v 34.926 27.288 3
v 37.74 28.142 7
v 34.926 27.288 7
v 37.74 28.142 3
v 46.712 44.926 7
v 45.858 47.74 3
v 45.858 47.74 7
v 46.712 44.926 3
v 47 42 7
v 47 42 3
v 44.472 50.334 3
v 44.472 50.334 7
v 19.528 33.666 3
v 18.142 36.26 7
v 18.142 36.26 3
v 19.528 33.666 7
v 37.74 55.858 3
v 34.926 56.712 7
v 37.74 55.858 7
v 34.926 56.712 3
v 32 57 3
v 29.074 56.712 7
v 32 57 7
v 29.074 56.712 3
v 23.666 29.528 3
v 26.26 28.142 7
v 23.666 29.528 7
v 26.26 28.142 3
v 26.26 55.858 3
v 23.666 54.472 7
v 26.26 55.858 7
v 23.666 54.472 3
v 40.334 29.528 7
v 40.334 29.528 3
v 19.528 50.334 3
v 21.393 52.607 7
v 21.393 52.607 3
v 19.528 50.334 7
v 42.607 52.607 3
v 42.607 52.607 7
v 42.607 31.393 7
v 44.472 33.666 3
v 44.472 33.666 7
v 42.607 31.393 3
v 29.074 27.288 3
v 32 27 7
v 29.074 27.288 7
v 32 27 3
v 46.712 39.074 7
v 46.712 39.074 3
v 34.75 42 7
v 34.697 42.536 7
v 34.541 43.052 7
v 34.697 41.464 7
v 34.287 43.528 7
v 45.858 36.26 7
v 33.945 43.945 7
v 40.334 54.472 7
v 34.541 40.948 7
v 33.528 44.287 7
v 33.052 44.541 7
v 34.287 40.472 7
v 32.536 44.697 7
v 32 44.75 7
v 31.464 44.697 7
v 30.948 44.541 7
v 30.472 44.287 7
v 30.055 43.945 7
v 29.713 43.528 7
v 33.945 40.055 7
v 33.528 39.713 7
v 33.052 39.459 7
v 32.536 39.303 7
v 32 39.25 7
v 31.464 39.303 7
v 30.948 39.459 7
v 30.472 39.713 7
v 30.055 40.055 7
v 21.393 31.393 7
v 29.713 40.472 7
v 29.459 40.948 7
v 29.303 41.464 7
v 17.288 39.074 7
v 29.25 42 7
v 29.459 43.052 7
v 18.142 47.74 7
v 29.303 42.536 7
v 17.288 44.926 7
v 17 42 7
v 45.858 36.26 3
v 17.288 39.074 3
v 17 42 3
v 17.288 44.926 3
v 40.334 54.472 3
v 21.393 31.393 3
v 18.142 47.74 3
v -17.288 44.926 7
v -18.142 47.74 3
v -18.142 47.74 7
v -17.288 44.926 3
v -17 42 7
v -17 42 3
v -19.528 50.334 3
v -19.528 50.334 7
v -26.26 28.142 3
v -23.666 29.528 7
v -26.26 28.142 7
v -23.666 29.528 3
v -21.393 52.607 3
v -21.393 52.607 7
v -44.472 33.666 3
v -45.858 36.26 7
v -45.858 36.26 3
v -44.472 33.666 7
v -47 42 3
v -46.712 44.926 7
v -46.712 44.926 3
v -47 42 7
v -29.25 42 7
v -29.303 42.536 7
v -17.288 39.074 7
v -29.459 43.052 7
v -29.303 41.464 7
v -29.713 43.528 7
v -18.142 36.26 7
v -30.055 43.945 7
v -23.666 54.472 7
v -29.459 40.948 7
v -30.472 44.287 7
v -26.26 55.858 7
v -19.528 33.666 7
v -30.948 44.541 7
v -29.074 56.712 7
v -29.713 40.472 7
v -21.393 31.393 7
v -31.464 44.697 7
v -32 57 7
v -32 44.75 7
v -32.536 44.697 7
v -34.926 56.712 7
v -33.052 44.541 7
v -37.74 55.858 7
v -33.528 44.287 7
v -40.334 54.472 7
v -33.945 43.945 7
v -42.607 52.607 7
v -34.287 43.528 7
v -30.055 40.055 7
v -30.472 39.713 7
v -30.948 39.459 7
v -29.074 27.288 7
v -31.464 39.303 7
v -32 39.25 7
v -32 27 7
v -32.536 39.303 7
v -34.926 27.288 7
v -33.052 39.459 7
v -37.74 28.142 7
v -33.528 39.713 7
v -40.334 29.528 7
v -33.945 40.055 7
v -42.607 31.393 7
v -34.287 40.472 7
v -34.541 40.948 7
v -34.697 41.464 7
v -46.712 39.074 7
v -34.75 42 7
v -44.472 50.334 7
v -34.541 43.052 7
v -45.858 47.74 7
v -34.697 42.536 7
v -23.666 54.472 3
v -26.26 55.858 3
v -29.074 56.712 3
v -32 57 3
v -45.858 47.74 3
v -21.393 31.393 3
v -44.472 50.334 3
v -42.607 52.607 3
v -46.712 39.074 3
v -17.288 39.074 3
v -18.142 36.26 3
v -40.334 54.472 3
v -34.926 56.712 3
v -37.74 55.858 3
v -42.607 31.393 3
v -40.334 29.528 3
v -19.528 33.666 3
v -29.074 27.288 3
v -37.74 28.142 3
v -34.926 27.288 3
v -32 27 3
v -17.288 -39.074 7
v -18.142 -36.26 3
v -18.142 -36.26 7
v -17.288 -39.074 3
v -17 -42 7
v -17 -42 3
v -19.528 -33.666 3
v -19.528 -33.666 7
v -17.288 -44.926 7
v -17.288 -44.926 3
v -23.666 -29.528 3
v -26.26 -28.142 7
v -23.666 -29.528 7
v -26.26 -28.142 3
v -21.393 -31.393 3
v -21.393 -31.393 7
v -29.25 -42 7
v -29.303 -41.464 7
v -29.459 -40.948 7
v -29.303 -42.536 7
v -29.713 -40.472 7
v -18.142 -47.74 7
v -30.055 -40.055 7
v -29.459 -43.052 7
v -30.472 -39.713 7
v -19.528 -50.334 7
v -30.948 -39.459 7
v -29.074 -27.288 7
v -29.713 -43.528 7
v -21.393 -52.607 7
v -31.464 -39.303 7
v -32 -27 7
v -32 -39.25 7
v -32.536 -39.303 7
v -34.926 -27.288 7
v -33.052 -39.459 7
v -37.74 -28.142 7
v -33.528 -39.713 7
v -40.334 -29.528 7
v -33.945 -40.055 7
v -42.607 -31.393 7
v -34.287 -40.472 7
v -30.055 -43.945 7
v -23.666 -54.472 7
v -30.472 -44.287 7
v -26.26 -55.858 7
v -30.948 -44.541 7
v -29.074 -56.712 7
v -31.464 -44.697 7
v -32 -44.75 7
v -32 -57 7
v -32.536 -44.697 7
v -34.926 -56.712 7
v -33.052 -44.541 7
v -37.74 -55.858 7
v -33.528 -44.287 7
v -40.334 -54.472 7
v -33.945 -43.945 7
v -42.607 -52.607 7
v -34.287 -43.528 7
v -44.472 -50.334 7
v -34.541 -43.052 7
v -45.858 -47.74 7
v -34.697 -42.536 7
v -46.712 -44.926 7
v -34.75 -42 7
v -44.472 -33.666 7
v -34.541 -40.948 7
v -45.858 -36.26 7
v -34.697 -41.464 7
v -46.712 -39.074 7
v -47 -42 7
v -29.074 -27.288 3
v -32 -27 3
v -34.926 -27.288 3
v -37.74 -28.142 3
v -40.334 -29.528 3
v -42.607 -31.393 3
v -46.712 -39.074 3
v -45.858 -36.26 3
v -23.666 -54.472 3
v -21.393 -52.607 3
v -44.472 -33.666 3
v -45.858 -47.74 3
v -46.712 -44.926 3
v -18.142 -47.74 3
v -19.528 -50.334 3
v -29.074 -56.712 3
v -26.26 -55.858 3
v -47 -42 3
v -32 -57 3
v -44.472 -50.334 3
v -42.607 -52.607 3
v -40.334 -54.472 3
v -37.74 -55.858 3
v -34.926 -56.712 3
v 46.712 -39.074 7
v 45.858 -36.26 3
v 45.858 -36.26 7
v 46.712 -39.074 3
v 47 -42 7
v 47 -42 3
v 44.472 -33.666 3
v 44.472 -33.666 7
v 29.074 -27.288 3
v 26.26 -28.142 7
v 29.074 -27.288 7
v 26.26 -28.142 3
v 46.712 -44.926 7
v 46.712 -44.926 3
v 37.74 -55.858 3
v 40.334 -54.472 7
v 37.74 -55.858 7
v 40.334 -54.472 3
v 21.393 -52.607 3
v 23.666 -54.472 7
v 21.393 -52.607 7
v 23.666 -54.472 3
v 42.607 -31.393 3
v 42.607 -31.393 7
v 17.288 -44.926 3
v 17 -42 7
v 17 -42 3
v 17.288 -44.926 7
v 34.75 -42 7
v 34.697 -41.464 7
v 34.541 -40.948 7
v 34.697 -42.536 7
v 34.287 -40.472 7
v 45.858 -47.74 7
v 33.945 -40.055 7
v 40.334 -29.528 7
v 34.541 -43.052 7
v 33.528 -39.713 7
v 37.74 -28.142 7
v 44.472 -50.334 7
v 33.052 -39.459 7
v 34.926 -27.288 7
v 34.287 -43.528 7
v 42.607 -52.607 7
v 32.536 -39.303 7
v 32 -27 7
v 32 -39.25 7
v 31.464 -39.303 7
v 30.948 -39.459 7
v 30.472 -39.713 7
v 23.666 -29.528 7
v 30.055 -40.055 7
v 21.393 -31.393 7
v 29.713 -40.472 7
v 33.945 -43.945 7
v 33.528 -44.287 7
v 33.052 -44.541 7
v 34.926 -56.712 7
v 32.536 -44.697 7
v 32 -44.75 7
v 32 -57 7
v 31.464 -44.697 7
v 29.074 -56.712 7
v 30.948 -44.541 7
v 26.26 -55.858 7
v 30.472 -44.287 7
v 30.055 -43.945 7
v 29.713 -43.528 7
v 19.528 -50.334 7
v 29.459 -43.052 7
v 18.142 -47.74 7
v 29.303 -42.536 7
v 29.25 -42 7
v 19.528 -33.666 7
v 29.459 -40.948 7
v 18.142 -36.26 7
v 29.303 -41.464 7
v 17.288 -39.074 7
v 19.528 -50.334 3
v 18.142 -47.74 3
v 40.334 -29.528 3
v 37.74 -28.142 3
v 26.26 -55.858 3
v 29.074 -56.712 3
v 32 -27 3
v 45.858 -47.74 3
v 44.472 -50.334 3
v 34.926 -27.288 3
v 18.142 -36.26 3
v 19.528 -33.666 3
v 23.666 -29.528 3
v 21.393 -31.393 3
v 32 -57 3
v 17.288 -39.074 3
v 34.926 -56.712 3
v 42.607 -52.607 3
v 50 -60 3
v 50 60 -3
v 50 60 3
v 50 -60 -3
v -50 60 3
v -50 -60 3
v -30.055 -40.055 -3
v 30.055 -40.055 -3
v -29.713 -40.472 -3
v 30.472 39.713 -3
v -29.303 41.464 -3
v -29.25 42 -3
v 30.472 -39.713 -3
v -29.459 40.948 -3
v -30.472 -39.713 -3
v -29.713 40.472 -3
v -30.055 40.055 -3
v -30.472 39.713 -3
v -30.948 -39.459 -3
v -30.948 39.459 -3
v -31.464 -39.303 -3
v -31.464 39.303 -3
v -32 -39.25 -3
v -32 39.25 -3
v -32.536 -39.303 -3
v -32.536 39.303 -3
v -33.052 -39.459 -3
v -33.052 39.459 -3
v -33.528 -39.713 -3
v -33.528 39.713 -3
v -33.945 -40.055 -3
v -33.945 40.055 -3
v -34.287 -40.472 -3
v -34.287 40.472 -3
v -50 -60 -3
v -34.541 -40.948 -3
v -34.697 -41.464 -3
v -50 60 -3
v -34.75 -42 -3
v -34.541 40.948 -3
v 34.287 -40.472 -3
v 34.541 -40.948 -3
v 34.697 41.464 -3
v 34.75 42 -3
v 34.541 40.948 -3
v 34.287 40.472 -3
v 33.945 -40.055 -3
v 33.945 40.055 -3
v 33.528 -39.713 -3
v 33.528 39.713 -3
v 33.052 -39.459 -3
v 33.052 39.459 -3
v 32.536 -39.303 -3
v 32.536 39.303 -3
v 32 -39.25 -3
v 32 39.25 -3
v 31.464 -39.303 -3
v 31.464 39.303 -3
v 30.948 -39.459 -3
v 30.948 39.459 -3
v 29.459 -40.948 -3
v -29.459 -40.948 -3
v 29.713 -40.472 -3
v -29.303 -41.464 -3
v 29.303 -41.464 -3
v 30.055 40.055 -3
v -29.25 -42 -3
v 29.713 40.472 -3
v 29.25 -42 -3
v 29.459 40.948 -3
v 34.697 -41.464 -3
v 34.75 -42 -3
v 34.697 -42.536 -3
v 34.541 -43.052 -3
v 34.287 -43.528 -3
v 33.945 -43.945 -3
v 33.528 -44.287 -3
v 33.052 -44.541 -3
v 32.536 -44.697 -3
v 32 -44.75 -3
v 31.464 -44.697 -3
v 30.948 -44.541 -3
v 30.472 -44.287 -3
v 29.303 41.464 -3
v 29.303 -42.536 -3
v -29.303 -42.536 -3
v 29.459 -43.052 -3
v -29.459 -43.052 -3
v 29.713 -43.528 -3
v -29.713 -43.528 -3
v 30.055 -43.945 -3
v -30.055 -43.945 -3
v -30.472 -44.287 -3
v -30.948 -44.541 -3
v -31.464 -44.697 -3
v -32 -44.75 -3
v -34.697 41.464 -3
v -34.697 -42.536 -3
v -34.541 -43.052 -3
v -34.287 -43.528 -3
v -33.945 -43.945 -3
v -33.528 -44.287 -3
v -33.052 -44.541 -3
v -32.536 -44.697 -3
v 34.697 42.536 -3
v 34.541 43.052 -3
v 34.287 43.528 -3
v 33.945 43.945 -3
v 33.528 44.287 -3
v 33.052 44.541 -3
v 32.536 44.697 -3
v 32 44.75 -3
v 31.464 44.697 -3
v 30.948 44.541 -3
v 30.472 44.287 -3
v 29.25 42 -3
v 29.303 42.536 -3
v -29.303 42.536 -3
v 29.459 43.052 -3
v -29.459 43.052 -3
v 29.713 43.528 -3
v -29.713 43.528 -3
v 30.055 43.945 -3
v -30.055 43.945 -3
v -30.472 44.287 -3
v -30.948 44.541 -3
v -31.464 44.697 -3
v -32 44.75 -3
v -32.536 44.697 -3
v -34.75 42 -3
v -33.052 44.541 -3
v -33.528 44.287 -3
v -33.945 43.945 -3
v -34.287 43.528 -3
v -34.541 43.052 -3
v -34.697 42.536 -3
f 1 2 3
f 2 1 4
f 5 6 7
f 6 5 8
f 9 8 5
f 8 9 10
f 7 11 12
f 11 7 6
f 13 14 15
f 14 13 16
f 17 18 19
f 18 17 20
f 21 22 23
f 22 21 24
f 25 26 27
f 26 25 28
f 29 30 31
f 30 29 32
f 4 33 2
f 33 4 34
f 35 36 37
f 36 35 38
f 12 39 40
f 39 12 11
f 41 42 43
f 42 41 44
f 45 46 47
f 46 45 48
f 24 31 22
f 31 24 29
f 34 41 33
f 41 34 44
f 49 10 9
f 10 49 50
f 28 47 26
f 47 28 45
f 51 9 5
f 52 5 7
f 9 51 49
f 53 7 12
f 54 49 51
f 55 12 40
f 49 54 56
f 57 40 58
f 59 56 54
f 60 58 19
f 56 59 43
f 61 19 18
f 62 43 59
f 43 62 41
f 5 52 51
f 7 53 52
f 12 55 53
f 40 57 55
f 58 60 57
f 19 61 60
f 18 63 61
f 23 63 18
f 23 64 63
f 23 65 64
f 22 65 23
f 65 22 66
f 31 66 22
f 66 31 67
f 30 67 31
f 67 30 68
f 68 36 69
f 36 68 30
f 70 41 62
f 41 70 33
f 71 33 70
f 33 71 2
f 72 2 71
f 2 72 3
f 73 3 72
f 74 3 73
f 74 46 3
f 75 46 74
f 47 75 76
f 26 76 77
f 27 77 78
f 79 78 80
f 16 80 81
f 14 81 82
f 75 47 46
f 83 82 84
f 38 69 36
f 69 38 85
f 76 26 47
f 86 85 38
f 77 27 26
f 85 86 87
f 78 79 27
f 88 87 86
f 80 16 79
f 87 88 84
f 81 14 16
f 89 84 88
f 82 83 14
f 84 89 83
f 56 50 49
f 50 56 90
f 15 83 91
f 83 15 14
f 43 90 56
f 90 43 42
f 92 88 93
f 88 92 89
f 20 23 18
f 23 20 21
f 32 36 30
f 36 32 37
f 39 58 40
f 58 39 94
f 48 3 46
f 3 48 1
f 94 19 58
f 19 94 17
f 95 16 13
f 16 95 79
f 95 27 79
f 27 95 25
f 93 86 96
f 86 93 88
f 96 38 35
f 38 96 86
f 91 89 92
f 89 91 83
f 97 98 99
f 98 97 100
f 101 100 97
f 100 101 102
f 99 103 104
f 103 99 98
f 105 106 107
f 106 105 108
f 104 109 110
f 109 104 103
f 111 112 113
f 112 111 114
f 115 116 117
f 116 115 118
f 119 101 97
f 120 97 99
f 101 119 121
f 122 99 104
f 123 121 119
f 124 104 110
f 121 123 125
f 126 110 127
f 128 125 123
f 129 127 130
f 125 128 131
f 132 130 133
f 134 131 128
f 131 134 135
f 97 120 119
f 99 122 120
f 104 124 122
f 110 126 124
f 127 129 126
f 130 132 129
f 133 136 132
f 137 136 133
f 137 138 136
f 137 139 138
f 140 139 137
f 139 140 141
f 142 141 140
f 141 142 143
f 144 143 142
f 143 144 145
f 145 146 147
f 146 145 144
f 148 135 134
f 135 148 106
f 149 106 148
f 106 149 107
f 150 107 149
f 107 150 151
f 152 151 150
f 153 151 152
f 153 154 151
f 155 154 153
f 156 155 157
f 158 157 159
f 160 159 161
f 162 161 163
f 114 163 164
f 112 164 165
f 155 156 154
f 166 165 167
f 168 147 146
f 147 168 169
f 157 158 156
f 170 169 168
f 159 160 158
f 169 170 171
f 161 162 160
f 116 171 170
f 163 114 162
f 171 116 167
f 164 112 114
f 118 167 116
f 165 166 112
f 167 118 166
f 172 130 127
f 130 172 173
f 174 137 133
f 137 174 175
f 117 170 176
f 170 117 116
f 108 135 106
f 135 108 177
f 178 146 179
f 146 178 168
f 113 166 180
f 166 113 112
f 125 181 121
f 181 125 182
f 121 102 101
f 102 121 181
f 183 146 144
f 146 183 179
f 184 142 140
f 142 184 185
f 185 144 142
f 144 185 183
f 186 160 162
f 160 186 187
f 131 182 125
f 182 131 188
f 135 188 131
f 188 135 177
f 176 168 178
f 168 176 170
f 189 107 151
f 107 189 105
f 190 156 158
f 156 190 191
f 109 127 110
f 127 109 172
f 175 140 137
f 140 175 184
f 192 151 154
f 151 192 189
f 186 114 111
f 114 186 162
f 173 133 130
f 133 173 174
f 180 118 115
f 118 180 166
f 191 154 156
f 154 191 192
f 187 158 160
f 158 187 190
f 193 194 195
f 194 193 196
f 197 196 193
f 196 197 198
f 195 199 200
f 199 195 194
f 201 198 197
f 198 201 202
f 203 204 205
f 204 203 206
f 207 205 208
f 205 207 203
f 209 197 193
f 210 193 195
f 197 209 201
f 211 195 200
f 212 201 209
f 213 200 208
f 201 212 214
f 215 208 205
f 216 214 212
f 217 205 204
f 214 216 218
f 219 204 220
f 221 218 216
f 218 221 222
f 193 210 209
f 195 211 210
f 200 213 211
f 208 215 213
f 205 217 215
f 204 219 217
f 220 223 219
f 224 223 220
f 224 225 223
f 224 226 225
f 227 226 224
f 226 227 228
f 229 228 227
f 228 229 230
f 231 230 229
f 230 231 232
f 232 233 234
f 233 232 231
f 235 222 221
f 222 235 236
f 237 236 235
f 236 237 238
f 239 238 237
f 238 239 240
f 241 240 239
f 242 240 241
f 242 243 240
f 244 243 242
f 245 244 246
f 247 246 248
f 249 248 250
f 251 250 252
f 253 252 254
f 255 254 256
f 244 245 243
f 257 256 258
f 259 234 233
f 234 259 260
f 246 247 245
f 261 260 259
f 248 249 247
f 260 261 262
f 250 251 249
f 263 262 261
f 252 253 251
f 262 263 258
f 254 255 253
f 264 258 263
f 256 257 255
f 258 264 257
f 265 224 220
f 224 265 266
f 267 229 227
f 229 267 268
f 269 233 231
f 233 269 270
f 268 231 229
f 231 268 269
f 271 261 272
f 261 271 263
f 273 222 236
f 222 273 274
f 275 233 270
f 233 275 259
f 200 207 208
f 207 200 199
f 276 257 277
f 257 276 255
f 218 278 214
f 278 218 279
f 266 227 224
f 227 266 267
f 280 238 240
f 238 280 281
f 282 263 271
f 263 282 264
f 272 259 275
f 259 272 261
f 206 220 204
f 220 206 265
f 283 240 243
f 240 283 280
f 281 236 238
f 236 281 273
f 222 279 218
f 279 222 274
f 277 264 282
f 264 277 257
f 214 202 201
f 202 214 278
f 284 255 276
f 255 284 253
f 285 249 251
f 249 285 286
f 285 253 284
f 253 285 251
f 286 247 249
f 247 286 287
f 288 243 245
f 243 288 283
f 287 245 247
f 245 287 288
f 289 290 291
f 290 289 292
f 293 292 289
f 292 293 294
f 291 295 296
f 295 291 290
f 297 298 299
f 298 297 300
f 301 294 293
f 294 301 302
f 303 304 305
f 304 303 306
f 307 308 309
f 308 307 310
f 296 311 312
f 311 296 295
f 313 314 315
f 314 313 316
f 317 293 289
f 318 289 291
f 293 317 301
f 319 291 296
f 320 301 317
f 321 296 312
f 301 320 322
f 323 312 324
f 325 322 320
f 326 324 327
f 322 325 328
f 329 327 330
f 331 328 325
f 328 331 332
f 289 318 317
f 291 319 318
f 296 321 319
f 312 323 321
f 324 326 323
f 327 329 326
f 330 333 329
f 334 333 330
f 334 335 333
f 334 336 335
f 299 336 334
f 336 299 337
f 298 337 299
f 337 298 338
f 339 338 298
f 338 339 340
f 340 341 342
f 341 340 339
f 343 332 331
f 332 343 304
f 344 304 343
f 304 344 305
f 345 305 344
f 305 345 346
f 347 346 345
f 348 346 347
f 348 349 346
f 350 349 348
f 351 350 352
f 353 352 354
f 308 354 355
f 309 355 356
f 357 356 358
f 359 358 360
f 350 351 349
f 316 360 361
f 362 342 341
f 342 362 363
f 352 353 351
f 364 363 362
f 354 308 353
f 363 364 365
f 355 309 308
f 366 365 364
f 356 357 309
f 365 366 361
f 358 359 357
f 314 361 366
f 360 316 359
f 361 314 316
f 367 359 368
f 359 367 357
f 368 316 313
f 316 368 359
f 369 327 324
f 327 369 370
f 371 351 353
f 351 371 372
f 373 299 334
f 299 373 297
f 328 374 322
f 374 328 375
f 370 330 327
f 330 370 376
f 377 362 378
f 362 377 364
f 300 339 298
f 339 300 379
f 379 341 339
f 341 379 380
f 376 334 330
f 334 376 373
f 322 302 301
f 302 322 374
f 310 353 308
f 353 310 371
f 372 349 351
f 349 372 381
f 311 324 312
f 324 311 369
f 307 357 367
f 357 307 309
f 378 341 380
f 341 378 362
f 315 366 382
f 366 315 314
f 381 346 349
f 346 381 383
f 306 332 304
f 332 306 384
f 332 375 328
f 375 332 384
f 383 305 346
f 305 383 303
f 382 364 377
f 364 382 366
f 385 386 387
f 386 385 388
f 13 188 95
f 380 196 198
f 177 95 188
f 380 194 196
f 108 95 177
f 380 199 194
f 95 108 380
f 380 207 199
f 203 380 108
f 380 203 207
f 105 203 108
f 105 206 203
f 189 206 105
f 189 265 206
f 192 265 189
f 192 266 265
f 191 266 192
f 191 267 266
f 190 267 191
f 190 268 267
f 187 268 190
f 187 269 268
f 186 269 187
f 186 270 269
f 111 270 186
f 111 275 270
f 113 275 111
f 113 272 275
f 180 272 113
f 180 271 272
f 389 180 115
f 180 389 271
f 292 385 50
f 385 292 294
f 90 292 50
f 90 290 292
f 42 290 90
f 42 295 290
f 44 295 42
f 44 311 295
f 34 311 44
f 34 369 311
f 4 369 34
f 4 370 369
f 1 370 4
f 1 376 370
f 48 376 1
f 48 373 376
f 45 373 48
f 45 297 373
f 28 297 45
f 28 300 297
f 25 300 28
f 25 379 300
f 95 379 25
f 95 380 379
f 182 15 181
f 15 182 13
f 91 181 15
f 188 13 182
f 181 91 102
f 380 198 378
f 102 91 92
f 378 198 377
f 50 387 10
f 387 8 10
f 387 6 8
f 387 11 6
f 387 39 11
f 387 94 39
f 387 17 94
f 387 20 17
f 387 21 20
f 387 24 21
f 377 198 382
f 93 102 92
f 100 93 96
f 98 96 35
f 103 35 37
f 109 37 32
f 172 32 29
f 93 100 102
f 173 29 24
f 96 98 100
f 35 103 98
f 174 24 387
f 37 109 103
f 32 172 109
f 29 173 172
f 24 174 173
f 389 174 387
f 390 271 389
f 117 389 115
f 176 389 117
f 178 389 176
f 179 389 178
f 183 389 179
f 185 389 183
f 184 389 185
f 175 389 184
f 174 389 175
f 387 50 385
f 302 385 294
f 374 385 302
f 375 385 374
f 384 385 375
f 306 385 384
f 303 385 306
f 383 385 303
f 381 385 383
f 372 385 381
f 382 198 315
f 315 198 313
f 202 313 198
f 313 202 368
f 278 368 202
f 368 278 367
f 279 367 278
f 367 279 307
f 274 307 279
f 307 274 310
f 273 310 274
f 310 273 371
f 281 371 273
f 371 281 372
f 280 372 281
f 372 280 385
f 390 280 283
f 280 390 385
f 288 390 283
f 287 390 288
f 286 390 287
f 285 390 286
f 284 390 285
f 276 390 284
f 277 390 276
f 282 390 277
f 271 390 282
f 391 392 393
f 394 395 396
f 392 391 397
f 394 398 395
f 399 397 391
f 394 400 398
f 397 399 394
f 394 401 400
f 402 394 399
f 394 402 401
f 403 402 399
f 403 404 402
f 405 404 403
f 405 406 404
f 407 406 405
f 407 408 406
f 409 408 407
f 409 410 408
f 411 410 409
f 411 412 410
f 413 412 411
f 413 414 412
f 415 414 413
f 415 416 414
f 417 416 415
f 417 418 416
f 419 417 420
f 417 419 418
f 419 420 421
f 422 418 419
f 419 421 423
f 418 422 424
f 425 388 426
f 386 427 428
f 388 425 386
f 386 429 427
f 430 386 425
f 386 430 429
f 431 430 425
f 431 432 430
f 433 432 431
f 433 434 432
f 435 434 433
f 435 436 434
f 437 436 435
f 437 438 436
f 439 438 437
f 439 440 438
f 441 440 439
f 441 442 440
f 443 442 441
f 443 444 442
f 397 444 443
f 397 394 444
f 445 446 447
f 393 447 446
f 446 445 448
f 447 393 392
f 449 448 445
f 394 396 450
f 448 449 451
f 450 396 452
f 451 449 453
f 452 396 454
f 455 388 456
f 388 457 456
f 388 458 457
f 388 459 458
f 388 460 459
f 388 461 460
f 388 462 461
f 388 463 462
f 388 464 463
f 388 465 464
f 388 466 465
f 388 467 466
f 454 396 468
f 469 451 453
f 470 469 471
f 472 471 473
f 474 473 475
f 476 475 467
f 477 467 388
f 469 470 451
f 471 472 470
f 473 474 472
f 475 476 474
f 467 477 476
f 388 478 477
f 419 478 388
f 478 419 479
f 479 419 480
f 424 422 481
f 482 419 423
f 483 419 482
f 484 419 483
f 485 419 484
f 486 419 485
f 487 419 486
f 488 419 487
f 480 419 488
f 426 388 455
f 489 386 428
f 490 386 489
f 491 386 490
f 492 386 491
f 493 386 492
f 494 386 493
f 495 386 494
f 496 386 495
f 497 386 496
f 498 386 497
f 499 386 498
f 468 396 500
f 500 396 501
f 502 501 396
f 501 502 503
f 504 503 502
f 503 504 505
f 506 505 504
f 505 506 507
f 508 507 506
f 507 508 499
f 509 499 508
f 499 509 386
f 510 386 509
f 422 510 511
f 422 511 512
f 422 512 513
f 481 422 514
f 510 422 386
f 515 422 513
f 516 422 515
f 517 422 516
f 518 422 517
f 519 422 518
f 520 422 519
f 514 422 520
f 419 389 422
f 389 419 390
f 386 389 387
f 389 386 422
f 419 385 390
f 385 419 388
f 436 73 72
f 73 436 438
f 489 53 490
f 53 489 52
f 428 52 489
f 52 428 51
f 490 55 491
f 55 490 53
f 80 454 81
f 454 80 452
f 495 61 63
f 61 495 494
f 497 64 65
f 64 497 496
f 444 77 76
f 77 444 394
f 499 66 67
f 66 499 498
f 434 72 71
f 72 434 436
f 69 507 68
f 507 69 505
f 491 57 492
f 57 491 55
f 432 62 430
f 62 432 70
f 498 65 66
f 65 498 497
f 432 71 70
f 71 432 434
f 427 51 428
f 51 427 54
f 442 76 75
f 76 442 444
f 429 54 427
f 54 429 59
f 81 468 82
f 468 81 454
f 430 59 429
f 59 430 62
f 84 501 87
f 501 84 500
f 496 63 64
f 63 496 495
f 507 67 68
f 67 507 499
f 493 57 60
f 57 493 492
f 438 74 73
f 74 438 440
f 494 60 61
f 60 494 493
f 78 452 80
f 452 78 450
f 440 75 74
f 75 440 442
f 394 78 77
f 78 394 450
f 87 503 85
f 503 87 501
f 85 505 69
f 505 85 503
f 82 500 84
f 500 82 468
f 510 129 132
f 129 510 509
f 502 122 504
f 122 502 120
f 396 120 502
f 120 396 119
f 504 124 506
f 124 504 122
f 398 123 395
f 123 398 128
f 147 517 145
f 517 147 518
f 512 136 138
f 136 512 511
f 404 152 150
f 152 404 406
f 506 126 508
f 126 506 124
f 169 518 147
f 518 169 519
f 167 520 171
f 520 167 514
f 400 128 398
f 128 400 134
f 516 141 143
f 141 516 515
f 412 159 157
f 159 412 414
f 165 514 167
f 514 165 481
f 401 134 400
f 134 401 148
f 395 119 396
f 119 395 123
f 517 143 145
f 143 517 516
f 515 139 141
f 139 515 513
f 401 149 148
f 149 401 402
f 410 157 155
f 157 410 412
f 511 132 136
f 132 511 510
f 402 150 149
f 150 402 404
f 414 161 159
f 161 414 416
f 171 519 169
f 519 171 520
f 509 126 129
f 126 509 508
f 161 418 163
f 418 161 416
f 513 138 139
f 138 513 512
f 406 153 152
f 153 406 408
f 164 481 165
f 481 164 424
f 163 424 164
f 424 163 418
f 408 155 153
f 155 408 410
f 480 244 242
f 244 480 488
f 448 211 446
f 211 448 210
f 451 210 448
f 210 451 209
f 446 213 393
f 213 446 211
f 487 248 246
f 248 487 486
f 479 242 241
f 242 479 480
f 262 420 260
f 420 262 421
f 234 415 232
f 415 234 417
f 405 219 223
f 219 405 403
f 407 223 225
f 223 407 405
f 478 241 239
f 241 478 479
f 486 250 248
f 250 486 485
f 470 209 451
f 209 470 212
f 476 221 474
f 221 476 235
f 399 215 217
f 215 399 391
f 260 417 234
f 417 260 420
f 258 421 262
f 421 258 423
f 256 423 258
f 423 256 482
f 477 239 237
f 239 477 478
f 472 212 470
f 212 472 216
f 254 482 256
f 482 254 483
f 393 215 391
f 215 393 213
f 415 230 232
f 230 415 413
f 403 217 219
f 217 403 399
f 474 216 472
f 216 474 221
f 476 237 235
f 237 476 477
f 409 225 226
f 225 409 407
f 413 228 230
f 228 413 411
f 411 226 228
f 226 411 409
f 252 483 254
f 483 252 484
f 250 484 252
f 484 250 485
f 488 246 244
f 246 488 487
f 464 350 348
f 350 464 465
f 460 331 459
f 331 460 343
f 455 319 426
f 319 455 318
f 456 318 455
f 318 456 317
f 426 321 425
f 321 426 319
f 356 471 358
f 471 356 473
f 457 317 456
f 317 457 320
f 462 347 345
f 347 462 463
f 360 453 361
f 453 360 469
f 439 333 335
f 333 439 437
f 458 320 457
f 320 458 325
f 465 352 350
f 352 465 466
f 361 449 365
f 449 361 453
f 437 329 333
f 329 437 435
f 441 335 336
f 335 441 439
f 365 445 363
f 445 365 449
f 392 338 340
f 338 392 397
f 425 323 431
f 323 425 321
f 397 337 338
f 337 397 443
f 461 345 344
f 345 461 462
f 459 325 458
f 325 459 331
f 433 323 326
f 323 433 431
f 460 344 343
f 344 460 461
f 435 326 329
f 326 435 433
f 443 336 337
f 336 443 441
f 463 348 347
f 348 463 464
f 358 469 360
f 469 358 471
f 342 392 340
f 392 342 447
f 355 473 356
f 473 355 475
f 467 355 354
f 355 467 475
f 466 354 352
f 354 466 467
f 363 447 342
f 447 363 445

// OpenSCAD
$fn = 32;

// ----------------------------------------------------------------------
// Anchor pads 100 x 120 x 10
// four corner bosses with anchor holes
// ----------------------------------------------------------------------

// --- parameters (mm) ---
plate = [100, 120, 6];  // base plate size (x, y, z)
pads = 4;               // boss count, one per corner
edge = 18;              // boss centre offset from the plate edge
boss_d = 30;            // boss diameter
boss_h = 4;             // boss height above the base plate
hole_d = 5.5;           // hole diameter

// --- derived feature positions (mm) ---
height = plate[2] + boss_h;      // = 10   overall height of the part
corner_x = plate[0] / 2 - edge;  // = 32   boss centre X
corner_y = plate[1] / 2 - edge;  // = 42   boss centre Y
feature_centers = [
  [corner_x, corner_y],
  [-corner_x, corner_y],
  [-corner_x, -corner_y],
  [corner_x, -corner_y]
];   // boss centres, anchor holes are drilled there

// base plate, four bosses standing on it, anchor holes all the way through
difference() {
  union() {
    cube(plate, center = true);
    for (centre = feature_centers)
      translate([centre[0], centre[1], plate[2] / 2 - 1])
        cylinder(d = boss_d, h = boss_h + 1);
  }
  for (centre = feature_centers)
    translate([centre[0], centre[1], -height])
      cylinder(d = hole_d, h = 2 * height + 2);  // through boss and plate
}
